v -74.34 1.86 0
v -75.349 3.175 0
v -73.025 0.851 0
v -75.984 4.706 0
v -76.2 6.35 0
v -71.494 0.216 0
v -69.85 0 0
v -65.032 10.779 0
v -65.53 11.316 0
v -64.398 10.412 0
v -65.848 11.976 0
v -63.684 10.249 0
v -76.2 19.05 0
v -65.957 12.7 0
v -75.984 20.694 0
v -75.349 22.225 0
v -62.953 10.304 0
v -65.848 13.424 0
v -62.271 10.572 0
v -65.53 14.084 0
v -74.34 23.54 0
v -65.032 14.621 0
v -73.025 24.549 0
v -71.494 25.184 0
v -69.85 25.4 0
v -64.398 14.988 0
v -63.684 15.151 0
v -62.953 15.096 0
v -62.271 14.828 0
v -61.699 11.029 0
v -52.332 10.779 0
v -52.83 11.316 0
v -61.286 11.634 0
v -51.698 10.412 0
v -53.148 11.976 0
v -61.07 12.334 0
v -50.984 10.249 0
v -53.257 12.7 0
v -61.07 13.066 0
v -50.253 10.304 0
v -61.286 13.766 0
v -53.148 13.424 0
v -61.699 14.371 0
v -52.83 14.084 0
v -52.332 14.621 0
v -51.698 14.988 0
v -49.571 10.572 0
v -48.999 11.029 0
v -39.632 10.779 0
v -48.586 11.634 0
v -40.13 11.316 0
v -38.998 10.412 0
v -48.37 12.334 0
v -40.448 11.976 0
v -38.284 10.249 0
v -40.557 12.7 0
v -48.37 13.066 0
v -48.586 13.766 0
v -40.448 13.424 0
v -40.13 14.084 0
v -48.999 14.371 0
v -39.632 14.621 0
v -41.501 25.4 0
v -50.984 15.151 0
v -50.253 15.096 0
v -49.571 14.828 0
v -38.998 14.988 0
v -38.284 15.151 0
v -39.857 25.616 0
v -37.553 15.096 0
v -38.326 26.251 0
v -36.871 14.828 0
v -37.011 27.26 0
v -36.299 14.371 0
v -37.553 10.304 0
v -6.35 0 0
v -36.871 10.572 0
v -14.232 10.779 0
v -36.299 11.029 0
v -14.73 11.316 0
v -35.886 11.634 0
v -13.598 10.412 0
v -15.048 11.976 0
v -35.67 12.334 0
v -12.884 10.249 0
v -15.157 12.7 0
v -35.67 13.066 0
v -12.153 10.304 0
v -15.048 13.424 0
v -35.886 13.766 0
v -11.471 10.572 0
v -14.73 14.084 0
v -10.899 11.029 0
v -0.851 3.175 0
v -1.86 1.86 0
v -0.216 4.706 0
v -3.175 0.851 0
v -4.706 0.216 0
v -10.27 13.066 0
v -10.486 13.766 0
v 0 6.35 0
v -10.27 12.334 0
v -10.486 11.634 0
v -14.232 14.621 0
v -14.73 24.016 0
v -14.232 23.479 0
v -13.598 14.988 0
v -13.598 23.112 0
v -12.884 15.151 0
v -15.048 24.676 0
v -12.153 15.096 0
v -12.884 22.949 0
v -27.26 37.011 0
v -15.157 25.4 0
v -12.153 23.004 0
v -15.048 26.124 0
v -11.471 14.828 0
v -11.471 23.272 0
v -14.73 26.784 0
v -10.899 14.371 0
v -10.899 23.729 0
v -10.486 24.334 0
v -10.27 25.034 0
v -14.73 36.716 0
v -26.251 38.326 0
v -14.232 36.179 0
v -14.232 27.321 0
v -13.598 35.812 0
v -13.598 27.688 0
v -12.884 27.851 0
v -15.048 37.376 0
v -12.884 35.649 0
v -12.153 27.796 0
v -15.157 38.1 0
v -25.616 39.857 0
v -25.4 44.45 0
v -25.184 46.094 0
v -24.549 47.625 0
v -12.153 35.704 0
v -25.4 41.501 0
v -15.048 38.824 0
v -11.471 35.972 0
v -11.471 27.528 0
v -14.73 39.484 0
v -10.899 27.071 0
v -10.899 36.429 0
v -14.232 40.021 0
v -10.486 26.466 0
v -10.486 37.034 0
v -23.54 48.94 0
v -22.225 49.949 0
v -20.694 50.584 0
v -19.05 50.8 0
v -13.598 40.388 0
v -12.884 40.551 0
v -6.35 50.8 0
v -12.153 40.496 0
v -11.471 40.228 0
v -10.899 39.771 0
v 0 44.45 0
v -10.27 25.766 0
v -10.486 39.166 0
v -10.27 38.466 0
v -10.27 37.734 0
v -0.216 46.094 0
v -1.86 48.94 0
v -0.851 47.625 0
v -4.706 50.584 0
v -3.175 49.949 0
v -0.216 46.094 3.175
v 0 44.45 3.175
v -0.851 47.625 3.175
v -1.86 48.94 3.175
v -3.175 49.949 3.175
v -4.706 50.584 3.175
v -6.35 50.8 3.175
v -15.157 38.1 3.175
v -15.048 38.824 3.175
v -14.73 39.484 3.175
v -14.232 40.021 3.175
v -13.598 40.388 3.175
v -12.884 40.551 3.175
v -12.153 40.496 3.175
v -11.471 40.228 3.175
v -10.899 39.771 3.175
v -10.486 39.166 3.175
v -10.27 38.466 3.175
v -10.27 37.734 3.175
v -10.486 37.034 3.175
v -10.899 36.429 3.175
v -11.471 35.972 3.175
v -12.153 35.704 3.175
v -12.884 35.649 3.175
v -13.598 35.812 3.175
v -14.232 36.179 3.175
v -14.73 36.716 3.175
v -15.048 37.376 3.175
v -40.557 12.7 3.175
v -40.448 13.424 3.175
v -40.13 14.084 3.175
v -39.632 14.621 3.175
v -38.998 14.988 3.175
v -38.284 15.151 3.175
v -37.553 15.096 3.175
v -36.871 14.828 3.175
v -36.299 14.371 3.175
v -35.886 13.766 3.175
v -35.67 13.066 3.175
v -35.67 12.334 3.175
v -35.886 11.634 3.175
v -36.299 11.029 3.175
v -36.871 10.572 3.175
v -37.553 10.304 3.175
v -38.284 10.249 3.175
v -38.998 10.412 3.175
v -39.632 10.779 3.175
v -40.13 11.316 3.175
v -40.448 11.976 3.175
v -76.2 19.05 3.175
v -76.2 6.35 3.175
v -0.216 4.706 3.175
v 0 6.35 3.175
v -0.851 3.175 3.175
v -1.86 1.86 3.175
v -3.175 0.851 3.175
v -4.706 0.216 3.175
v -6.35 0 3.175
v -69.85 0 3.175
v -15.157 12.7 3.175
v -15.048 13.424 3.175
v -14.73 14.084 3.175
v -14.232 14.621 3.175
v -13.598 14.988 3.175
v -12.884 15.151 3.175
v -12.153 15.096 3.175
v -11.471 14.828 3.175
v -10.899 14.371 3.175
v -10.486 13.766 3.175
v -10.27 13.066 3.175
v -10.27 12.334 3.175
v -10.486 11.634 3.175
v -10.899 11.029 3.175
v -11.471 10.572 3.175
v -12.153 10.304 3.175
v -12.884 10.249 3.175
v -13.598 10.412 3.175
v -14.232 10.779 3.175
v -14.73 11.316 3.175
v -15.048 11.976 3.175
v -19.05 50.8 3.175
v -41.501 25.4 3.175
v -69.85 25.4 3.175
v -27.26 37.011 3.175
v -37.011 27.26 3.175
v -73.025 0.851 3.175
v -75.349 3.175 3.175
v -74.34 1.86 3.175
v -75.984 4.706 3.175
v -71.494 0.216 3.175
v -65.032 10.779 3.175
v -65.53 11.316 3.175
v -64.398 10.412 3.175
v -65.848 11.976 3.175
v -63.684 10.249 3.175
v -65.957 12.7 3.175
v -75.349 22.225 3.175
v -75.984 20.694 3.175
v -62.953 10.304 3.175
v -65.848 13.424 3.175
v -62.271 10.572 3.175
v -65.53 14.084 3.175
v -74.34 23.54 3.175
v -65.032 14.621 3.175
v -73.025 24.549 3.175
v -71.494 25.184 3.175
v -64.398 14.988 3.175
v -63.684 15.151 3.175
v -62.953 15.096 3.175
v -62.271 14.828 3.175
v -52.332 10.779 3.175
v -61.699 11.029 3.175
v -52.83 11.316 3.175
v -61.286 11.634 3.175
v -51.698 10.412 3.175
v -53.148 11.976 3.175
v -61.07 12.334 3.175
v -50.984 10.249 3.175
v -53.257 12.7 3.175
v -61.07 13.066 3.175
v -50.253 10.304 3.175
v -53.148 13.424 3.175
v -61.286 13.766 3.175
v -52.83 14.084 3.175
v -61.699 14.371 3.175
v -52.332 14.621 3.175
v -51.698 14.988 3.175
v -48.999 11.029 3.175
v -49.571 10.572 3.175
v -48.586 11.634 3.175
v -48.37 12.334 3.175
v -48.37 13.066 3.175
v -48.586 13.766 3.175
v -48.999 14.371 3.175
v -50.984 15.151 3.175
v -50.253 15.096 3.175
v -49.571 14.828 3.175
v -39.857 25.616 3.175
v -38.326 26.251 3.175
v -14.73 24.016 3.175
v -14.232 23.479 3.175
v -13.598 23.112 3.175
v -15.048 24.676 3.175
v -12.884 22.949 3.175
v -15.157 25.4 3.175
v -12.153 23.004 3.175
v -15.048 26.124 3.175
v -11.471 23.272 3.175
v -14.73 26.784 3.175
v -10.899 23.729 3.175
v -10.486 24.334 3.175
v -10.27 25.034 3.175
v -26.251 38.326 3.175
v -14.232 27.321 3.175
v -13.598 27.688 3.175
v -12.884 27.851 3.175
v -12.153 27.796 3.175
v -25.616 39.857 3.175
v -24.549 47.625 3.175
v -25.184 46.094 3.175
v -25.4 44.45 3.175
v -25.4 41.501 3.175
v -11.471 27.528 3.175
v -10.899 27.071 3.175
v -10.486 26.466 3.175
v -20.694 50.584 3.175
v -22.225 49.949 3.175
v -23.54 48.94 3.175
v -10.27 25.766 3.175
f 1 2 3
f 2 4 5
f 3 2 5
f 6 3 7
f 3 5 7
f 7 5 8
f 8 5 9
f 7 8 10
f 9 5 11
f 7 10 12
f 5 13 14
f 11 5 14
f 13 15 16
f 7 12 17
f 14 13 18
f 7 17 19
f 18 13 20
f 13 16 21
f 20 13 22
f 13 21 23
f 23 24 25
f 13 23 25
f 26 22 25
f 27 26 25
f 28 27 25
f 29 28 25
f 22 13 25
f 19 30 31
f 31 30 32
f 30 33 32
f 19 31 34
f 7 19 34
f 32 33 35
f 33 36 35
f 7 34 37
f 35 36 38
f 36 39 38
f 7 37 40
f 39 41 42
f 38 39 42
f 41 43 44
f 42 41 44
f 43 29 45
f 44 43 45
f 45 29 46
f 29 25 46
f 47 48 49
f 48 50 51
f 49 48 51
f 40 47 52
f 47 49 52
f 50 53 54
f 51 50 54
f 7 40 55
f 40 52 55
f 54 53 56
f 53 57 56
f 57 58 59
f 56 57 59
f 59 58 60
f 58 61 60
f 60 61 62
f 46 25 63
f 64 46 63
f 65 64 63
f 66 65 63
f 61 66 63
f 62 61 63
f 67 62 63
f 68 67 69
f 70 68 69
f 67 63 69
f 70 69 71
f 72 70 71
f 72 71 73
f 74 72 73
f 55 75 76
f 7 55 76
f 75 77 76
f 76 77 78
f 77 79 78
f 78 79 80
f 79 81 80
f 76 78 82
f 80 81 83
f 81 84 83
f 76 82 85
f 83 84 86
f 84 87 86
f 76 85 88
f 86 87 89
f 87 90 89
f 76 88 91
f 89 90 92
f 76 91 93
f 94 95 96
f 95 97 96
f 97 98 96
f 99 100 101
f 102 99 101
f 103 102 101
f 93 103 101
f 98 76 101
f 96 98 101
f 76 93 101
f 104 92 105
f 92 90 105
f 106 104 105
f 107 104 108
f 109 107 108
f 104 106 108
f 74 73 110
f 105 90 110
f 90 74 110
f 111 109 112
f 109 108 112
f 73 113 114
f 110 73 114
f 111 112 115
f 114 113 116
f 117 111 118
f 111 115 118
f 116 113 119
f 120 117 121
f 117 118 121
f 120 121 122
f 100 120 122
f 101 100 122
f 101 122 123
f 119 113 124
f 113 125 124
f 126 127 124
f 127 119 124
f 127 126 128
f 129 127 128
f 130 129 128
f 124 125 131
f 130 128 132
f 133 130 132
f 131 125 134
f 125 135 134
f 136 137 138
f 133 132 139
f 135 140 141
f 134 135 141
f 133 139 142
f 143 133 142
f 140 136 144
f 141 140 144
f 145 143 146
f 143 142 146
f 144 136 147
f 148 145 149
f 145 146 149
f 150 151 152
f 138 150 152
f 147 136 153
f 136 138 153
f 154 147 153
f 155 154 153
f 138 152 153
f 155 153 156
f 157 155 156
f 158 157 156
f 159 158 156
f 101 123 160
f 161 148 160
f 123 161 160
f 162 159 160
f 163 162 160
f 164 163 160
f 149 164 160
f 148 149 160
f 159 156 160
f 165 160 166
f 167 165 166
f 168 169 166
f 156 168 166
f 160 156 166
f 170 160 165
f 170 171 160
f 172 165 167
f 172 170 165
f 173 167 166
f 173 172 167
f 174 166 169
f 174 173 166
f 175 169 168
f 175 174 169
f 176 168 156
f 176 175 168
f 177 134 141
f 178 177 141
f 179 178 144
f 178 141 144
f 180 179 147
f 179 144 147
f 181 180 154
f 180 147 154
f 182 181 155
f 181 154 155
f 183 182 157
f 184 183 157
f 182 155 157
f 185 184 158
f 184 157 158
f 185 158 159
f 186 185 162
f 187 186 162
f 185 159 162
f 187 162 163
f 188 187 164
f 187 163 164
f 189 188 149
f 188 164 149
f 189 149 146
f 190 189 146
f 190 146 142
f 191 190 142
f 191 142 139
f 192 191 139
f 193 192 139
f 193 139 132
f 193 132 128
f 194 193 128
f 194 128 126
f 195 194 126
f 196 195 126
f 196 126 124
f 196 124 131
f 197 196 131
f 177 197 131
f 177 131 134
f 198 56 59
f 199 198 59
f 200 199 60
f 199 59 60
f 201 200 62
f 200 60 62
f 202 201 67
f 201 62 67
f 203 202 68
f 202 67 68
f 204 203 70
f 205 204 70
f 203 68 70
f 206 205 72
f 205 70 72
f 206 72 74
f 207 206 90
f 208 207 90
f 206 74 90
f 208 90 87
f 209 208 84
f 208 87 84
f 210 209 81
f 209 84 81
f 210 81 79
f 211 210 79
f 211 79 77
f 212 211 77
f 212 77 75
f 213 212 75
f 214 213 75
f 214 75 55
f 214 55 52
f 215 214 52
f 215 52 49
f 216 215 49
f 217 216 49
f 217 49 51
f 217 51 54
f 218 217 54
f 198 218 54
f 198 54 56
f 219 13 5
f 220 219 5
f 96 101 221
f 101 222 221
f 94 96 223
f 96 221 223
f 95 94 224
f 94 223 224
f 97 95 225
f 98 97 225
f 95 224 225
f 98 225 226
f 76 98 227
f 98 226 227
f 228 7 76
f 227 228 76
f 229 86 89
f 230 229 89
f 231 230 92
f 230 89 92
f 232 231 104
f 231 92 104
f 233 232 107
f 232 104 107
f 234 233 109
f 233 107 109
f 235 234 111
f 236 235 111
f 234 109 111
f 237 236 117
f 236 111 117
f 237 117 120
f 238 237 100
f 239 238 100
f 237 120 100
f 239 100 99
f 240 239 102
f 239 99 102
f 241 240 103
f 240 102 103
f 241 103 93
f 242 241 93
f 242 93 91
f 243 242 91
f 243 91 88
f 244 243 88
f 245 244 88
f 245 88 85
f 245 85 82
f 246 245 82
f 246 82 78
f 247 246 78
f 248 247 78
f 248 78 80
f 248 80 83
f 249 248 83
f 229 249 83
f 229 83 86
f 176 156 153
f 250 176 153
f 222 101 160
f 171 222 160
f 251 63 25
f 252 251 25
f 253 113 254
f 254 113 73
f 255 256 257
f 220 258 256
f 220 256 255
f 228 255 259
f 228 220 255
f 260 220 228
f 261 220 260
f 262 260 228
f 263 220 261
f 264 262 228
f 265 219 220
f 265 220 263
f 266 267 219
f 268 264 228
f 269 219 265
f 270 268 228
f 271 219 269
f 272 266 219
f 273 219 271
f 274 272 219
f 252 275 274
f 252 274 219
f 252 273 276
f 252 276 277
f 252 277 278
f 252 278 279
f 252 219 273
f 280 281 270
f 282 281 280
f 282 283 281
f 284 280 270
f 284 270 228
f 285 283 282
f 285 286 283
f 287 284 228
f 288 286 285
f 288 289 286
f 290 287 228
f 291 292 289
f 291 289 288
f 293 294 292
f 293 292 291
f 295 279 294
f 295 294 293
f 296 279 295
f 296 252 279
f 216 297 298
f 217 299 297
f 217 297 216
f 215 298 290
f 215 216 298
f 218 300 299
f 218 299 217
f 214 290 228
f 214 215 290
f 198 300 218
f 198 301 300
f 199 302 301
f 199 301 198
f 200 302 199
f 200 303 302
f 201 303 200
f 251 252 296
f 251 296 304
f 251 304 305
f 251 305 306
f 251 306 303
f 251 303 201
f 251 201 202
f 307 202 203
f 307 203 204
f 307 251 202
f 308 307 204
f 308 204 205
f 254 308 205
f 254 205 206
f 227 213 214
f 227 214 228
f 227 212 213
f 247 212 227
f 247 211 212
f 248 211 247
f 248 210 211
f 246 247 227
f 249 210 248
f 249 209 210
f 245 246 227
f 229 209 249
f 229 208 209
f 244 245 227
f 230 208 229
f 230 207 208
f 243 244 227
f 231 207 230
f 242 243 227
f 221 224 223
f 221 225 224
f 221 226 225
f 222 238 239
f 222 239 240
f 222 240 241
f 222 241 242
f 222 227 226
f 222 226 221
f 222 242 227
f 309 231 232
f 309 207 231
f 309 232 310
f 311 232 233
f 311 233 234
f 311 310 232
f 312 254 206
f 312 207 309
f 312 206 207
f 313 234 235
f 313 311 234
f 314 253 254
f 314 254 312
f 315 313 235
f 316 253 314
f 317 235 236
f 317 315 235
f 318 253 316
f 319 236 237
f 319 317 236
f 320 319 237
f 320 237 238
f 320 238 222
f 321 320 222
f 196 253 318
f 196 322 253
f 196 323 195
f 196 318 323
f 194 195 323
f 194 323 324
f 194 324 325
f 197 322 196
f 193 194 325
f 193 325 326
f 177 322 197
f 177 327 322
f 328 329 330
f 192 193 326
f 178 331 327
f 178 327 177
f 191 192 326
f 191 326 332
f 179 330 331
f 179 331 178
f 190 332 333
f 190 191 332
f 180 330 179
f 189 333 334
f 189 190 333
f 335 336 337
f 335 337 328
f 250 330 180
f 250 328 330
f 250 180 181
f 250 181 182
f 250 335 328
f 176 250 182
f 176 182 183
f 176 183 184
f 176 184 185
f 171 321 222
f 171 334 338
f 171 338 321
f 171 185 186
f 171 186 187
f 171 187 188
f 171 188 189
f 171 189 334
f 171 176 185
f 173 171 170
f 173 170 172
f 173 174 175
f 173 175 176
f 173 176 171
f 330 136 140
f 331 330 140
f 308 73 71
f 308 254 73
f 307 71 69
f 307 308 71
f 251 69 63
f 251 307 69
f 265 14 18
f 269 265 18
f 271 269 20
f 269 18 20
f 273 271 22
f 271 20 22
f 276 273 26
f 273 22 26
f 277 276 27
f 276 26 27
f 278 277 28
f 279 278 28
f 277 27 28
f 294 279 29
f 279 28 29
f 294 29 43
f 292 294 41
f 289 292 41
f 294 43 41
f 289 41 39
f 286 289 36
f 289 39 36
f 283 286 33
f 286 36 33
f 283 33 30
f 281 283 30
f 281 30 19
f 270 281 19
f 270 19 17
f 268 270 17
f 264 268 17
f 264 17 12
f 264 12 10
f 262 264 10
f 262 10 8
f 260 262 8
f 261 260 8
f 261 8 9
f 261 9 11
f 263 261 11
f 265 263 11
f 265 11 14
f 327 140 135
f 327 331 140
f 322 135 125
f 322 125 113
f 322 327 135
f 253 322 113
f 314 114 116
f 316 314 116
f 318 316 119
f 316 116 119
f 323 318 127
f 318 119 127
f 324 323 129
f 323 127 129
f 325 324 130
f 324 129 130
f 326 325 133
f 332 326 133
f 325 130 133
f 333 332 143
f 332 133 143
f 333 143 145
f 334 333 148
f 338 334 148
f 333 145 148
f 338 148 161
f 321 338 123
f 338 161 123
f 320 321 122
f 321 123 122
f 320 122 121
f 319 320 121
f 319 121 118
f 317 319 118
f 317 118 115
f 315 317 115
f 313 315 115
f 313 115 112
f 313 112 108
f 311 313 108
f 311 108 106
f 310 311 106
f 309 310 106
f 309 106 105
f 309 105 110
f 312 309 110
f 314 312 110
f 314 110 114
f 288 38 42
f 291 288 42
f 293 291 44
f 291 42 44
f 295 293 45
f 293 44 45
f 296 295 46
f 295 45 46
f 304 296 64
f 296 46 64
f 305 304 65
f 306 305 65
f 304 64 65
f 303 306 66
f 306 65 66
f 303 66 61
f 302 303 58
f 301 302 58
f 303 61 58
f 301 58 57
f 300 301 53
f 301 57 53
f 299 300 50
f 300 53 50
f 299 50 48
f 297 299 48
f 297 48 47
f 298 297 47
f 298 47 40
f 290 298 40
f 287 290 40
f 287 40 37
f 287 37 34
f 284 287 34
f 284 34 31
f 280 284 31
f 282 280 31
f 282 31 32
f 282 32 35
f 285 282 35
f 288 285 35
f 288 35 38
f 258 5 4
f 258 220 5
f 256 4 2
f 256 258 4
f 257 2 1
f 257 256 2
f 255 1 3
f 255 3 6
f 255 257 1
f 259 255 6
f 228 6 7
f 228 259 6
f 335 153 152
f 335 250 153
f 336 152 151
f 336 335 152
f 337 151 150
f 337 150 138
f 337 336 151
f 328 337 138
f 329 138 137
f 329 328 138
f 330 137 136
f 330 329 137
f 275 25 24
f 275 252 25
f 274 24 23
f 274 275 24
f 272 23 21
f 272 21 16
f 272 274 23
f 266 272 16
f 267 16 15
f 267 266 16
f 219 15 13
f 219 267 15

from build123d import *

# Parameters (mm, degrees)
BOSS_EXTRUDE1_DEPTH          = 3.175
FILLET1_R                    = 6.35
F_10_0_1935_DIAMETER_HOLE1_D = 4.9149


with BuildPart() as part:
    # Sketch1 → Boss-Extrude1 (new body)
    with BuildSketch(Plane.XY):
        Polygon((0, 0), (0, 50.8), (-25.4, 50.8), (-25.4, 38.870384182), (-38.870384182, 25.4), (-76.2, 25.4), (-76.2, 0), align=None)
    extrude(amount=BOSS_EXTRUDE1_DEPTH)

    # Fillet1
    fillet1_edges = [part.edges().sort_by_distance(p)[0] for p in [
        (-76.2, 0, 1.5875),
        (-76.2, 25.4, 1.5875),
        (-38.870384182, 25.4, 1.5875),
        (-25.4, 38.870384182, 1.5875),
        (-25.4, 50.8, 1.5875),
        (0, 50.8, 1.5875),
        (0, 0, 1.5875),
    ]]
    fillet(fillet1_edges, radius=FILLET1_R)

    # #10 (0.1935) Diameter Hole1 (through all)
    with Locations(Plane.XY.offset(3.175)):
        with Locations((-63.5, 12.7), (-50.8, 12.7), (-12.7, 25.4), (-12.7, 38.1), (-38.1, 12.7), (-12.7, 12.7)):
            Hole(F_10_0_1935_DIAMETER_HOLE1_D / 2)


solid = part.part
